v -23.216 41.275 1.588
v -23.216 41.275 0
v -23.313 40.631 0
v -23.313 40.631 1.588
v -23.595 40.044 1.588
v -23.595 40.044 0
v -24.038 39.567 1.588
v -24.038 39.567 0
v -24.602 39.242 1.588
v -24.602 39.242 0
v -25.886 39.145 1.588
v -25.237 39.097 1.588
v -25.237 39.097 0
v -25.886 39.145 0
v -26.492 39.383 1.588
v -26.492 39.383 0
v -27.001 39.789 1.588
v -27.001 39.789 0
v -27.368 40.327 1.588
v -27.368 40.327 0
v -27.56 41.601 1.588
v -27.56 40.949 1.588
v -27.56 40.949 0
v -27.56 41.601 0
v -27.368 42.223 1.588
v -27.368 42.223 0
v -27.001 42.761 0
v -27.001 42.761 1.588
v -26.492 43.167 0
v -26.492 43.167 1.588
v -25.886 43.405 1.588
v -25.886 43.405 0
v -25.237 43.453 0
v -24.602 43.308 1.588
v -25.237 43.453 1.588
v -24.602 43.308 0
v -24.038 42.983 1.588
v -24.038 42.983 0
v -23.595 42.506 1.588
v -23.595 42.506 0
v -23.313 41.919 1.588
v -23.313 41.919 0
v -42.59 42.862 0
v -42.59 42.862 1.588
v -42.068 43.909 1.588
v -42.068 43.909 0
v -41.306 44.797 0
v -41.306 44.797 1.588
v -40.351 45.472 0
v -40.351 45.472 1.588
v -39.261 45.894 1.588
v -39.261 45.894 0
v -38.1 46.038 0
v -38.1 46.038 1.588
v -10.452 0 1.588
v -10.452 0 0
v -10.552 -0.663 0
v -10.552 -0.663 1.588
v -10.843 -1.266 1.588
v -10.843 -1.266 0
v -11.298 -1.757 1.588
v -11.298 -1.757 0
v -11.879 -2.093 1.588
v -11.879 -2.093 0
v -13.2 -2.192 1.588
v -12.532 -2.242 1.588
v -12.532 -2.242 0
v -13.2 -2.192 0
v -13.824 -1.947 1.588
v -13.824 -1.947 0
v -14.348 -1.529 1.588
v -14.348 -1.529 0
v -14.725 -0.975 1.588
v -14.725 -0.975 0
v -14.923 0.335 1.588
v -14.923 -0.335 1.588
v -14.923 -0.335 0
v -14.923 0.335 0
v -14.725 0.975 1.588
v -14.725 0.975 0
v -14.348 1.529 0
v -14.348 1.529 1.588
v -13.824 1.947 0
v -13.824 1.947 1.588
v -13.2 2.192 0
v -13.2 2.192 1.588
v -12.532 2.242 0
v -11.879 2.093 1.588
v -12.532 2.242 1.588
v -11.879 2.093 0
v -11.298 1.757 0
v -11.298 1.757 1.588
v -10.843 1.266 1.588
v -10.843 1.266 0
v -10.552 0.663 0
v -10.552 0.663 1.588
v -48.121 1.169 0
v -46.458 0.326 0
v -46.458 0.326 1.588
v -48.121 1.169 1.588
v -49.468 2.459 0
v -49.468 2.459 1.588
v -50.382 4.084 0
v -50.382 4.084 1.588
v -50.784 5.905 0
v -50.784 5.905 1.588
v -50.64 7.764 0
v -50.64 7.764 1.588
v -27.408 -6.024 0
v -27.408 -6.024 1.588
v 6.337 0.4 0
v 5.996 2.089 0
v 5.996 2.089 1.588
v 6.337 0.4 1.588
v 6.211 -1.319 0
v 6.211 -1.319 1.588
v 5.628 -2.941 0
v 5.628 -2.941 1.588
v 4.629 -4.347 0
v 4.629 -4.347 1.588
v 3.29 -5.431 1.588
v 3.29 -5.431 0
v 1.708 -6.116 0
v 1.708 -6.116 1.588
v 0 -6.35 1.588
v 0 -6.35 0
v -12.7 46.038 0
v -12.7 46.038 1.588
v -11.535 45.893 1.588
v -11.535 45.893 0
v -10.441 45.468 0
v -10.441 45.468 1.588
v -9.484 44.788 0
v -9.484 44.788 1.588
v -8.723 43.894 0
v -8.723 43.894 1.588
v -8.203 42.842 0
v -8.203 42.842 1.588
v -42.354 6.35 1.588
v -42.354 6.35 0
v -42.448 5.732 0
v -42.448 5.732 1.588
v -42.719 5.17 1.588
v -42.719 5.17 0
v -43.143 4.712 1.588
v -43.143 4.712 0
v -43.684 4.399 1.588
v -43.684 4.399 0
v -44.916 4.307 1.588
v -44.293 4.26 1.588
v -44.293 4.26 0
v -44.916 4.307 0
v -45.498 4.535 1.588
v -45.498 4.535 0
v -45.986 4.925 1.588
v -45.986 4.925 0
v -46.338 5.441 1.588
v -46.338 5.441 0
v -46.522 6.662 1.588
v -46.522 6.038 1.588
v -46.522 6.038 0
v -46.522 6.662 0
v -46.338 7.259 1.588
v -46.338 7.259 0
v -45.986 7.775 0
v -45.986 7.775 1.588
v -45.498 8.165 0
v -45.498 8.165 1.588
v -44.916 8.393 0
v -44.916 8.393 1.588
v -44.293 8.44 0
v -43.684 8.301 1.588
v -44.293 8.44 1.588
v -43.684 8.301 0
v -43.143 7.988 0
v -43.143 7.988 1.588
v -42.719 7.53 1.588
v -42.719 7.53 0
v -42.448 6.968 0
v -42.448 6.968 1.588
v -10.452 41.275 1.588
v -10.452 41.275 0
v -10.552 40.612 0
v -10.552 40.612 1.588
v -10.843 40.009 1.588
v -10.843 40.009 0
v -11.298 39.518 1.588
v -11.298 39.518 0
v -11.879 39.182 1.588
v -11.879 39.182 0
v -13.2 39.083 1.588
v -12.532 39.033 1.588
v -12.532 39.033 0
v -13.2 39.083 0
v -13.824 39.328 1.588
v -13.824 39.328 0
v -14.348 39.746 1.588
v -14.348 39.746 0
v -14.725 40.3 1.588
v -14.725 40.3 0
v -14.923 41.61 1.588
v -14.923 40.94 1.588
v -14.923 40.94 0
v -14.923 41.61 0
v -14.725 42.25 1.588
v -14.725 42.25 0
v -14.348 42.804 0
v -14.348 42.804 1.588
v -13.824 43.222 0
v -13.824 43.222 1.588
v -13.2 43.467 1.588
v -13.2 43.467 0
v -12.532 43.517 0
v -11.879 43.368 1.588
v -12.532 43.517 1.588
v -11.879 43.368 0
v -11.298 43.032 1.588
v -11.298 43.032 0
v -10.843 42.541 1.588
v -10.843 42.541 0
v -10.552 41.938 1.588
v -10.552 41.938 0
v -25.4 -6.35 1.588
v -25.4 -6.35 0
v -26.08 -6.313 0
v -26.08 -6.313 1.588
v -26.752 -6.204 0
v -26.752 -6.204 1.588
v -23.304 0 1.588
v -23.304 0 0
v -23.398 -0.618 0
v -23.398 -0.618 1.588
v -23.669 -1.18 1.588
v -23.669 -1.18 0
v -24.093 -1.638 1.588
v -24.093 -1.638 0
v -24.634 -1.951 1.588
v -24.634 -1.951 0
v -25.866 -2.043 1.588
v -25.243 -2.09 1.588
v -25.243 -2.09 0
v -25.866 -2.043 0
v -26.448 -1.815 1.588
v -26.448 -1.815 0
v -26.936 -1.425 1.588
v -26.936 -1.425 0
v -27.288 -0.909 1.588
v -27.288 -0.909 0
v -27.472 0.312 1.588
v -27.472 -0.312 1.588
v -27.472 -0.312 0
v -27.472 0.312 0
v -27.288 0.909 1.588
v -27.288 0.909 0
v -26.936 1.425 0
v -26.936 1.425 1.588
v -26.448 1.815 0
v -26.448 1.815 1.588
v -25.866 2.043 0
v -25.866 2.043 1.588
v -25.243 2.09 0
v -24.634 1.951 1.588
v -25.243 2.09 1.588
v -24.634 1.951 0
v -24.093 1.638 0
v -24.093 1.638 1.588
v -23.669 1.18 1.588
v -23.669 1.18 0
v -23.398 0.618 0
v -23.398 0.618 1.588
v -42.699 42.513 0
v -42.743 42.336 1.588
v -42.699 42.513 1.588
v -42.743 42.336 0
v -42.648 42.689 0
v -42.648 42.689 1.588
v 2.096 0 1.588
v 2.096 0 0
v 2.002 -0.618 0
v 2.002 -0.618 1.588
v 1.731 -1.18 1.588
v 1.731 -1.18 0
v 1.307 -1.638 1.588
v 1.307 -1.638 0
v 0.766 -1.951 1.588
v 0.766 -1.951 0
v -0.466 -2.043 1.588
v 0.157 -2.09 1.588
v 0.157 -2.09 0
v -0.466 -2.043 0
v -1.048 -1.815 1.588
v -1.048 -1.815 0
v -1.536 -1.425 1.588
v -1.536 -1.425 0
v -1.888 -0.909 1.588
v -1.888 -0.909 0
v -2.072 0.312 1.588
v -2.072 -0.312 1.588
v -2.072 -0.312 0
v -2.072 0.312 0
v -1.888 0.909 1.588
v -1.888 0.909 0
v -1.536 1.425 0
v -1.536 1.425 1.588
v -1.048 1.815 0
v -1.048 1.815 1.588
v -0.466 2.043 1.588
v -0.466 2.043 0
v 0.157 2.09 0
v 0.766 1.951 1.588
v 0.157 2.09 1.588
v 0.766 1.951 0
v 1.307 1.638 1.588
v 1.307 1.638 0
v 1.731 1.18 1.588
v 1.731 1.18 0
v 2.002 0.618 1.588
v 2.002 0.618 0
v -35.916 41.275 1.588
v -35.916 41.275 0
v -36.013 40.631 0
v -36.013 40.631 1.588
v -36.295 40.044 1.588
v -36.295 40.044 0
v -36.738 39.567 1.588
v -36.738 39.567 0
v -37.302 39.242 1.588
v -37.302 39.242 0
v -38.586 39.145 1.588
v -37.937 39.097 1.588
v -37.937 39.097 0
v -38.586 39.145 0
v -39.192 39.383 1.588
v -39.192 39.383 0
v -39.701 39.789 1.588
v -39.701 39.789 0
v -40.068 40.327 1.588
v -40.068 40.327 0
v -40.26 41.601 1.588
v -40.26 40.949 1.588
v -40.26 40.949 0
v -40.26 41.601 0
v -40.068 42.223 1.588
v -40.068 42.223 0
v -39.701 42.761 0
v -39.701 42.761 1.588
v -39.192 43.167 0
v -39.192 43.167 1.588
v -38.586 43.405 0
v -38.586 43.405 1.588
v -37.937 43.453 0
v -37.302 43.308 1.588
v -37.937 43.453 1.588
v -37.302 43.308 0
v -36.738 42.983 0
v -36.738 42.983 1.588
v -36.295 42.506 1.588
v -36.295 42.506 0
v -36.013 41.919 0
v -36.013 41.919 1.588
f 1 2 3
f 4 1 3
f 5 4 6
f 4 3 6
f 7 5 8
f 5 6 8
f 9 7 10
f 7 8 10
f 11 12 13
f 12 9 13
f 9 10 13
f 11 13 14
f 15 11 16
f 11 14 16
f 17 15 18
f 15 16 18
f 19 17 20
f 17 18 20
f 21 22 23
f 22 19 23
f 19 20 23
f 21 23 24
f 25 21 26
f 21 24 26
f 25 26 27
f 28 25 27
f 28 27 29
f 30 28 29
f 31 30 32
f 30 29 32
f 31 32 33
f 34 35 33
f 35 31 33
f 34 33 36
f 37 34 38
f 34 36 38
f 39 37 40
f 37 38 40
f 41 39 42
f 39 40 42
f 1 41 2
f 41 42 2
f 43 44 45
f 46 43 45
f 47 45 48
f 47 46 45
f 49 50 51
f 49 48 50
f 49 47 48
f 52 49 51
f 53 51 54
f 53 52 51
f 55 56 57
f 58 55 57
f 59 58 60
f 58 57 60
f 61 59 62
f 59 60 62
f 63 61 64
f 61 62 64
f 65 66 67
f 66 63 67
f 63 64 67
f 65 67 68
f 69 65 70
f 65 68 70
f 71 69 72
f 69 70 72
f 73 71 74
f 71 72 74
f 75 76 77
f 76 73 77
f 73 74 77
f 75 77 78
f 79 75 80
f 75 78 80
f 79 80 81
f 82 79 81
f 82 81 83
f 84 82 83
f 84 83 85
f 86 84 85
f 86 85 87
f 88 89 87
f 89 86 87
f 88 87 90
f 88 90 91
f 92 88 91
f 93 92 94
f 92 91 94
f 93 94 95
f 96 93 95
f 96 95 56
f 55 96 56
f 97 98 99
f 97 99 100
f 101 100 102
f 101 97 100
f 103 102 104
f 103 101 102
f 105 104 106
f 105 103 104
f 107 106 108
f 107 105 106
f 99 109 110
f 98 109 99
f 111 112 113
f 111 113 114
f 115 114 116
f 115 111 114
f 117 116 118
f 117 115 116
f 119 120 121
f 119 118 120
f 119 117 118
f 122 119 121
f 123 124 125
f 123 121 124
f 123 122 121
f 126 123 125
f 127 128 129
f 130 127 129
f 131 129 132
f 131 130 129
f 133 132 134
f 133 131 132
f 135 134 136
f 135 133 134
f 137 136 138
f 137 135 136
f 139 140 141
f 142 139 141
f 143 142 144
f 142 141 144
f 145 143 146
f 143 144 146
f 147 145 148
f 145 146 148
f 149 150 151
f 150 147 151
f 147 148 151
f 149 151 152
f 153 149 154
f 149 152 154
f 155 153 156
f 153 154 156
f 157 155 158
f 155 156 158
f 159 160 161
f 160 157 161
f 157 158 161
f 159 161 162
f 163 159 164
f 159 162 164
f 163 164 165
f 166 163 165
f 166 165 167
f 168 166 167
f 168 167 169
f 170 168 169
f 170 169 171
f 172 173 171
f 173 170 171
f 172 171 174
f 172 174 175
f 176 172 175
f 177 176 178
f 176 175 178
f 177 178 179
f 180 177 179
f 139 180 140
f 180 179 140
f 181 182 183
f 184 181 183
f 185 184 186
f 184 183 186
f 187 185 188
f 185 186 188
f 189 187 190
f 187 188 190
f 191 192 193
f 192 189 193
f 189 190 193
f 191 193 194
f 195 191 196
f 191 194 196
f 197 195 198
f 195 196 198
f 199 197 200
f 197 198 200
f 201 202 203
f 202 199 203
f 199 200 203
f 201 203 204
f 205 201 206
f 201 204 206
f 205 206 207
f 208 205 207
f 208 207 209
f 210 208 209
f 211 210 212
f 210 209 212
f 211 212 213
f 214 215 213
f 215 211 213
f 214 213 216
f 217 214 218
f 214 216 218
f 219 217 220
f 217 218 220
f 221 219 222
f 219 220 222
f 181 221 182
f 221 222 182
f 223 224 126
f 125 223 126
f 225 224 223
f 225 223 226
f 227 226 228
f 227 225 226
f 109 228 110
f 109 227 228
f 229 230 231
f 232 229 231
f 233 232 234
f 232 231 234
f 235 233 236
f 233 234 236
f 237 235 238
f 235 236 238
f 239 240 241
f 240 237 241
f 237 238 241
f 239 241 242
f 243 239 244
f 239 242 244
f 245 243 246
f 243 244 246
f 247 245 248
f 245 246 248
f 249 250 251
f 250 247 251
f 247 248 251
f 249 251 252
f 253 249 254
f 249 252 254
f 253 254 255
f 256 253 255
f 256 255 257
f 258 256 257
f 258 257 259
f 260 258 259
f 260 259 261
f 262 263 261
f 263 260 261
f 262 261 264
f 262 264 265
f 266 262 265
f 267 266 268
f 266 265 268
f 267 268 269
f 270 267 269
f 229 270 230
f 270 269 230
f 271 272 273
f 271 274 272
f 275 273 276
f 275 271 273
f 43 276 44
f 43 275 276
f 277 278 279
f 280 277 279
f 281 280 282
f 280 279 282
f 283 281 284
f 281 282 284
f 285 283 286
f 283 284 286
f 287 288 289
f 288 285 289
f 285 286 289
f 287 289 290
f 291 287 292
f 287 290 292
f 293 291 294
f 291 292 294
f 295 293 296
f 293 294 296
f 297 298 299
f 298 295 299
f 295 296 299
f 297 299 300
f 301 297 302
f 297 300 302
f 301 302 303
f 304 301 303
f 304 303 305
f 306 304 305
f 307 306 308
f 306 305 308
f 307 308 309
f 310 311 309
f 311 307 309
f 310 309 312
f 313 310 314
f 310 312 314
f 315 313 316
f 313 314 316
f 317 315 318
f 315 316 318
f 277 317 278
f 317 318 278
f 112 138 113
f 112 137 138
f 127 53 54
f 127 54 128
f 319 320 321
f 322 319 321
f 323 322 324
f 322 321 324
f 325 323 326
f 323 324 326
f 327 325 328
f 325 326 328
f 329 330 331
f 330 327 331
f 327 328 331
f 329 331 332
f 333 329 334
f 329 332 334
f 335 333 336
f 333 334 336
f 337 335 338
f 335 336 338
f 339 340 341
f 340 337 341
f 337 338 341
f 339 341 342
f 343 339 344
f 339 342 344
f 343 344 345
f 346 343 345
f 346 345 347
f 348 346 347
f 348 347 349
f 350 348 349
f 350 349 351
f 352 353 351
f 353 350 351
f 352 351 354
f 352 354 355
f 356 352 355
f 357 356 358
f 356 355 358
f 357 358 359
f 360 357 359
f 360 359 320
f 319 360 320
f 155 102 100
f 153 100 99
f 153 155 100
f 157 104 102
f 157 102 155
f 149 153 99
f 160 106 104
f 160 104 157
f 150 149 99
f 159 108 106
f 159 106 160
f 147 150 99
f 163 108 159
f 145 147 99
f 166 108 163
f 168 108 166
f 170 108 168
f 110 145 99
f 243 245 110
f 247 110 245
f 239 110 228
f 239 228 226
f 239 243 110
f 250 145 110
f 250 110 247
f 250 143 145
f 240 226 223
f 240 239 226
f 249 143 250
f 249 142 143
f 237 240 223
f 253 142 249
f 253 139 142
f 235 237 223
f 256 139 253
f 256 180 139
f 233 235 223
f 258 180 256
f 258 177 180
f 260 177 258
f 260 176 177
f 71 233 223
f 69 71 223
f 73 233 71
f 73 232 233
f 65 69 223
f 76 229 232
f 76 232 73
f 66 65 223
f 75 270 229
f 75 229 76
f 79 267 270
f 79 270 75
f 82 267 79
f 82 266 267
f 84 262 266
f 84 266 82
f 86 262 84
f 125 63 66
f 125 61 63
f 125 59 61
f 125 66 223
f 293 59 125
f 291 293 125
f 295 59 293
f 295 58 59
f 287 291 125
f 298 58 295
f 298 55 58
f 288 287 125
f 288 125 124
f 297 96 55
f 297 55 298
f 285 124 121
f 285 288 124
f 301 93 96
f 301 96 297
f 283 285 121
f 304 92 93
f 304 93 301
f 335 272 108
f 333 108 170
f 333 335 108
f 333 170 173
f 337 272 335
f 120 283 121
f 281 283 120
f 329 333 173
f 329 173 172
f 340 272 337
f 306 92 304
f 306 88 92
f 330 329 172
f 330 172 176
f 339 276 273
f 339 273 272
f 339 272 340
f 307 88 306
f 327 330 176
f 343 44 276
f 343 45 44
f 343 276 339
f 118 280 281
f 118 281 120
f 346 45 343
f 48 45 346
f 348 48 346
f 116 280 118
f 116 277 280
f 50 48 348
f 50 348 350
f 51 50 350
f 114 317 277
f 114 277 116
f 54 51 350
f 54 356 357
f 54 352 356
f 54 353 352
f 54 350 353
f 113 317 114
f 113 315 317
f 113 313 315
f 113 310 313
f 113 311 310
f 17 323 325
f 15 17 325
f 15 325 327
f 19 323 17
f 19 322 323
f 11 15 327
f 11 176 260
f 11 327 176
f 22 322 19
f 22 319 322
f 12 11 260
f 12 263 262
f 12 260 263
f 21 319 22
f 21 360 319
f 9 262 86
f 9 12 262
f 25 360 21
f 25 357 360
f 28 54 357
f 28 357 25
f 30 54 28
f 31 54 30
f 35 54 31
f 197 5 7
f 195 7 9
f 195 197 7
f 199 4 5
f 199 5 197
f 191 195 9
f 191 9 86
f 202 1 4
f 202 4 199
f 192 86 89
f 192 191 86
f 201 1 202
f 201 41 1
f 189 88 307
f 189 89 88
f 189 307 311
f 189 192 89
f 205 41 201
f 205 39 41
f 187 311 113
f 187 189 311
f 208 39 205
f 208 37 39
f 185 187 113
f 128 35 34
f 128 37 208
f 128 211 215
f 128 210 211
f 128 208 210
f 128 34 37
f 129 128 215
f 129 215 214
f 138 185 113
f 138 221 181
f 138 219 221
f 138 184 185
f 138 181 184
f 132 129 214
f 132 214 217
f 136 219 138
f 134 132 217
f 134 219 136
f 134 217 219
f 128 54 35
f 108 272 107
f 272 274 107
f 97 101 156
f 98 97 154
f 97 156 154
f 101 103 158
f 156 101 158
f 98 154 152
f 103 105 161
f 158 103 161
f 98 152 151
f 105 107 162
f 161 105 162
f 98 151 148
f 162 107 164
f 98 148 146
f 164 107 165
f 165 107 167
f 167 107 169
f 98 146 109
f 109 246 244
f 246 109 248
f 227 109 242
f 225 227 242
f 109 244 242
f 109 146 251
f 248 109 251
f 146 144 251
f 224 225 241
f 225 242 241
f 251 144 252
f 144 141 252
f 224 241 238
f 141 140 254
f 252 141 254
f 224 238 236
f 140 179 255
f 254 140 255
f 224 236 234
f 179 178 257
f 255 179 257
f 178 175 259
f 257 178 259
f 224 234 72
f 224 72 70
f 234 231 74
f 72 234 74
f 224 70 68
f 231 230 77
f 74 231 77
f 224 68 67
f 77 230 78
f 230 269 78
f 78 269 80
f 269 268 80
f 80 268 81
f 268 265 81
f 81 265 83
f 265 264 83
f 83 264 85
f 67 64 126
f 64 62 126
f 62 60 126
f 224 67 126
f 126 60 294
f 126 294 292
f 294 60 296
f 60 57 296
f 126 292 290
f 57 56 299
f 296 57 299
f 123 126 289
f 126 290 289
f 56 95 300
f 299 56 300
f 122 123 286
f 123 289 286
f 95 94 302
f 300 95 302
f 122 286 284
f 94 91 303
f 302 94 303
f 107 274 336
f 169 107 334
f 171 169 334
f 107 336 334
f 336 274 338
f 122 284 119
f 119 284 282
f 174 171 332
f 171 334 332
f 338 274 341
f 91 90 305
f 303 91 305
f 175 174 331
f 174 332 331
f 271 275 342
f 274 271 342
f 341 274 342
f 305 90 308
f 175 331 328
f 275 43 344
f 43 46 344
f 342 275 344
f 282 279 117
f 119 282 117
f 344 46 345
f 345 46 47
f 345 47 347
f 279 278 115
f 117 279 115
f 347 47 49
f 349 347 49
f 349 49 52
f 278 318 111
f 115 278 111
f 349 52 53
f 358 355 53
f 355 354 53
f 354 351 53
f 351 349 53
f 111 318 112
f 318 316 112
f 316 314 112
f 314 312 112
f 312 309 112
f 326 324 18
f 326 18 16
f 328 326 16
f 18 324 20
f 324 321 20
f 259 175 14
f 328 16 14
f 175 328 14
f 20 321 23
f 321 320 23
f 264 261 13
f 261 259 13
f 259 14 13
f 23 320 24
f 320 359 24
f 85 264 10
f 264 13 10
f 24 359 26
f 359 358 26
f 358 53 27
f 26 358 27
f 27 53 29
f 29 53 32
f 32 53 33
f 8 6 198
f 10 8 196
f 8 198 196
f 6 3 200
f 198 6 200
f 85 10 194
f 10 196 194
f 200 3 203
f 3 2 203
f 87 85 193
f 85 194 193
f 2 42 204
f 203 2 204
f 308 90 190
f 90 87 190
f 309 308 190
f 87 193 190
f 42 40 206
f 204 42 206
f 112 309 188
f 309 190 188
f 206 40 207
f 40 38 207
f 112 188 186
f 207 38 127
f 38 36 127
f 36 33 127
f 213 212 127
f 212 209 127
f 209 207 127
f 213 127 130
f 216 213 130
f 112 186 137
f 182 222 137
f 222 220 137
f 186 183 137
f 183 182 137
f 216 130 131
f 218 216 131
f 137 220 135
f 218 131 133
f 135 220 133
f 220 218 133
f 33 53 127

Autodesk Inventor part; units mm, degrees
ref_plane "YZ Plane" through (0, 0, 0) normal (1, 0, 0) x (0, 1, 0)
ref_plane "XZ Plane" through (0, 0, 0) normal (0, 1, 0) x (-1, 0, 0)
ref_plane "XY Plane" through (0, 0, 0) normal (0, 0, 1) x (1, 0, 0)
sketch "main" plane through (0, 0, 0) normal (0, 0, 1) x (1, 0, 0)
  circle A0 centre (-38.8868, 18.5788) radius 2.2479
  circle A1 centre (2.3882, 18.5788) radius 2.2479
  circle A2 centre (2.3882, 43.9788) radius 2.1844
  arc A3 (3.9757, 48.4689) -> (3.4489, 48.6217) centre (2.3882, 43.9788) ccw
  arc A4 (3.9552, 14.0814) -> (7.1507, 18.5788) centre (2.3882, 18.5788) ccw
  circle A5 centre (-38.8868, 31.2788) radius 2.0955
  circle A6 centre (-38.8868, 5.8788) radius 2.0955
  arc A7 (-44.9109, 33.2868) -> (-45.2368, 31.2788) centre (-38.8868, 31.2788) ccw
  arc A8 (-45.2368, 5.8788) -> (-36.7975, -0.1177) centre (-38.8868, 5.8788) ccw
  circle A9 centre (-32.5368, 50.3288) radius 2.0955
  arc A10 (-31.1226, 56.5193) -> (-38.5609, 52.3368) centre (-32.5368, 50.3288) ccw
  line L0 (-44.9109, 33.2868) -> (-38.5609, 52.3368)
  line L1 (3.4489, 48.6217) -> (-31.1226, 56.5193)
  line L2 (3.9552, 14.0814) -> (-36.7975, -0.1177)
  line L3 (-45.2368, 31.2788) -> (-45.2368, 5.8788)
  arc A11 (7.1507, 43.9788) -> (3.4489, 48.6217) centre (2.3882, 43.9788) ccw
  line L4 (7.1507, 43.9788) -> (7.1507, 18.5788)
  circle A12 centre (2.3882, 31.2788) radius 2.1844
  point P0 (-4.3882, 4.0845)
  dimension "d11" = 4.4958
  dimension "d12" = 4.4958
  dimension "d13" = 9.525
  dimension "d14" = 9.525
  dimension "d15" = 4.191
  dimension "d16" = 4.191
  dimension "d17" = 41.275
  dimension "d18" = 41.275
  dimension "d19" = 25.4
  dimension "d20" = 4.3688
  dimension "d21" = 12.7
sketch "Sketch1" plane through (0, 0, 0) normal (0, 0, 1) x (1, 0, 0)
  circle A0 centre (-12.7, 0) radius 2.2479
  circle A1 centre (-12.7, 41.275) radius 2.2479
  circle A2 centre (-38.1, 41.275) radius 2.1844
  arc A3 (-42.5901, 42.8625) -> (-42.7429, 42.3356) centre (-38.1, 41.275) ccw
  arc A4 (-8.2027, 42.842) -> (-12.7, 46.0375) centre (-12.7, 41.275) ccw
  circle A5 centre (-25.4, 0) radius 2.0955
  circle A6 centre (0, 0) radius 2.0955
  arc A7 (-27.408, -6.0241) -> (-25.4, -6.35) centre (-25.4, 0) ccw
  arc A8 (0, -6.35) -> (5.9964, 2.0893) centre (0, 0) ccw
  circle A9 centre (-44.45, 6.35) radius 2.0955
  arc A10 (-50.6405, 7.7642) -> (-46.458, 0.3259) centre (-44.45, 6.35) ccw
  line L0 (-27.408, -6.0241) -> (-46.458, 0.3259)
  line L1 (-42.7429, 42.3356) -> (-50.6405, 7.7642)
  line L2 (-8.2027, 42.842) -> (5.9964, 2.0893)
  line L3 (-25.4, -6.35) -> (0, -6.35)
  arc A11 (-38.1, 46.0375) -> (-42.7429, 42.3356) centre (-38.1, 41.275) ccw
  line L4 (-38.1, 46.0375) -> (-12.7, 46.0375)
  circle A12 centre (-25.4, 41.275) radius 2.1844
  point P0 (0, 0)
  point P1 (-42.5901, 42.8625)
extrude "Extrusion1" add sketch "Sketch1" along normal blind 1.5875
properties part number "gusset" material "Acetal Resin, White"
